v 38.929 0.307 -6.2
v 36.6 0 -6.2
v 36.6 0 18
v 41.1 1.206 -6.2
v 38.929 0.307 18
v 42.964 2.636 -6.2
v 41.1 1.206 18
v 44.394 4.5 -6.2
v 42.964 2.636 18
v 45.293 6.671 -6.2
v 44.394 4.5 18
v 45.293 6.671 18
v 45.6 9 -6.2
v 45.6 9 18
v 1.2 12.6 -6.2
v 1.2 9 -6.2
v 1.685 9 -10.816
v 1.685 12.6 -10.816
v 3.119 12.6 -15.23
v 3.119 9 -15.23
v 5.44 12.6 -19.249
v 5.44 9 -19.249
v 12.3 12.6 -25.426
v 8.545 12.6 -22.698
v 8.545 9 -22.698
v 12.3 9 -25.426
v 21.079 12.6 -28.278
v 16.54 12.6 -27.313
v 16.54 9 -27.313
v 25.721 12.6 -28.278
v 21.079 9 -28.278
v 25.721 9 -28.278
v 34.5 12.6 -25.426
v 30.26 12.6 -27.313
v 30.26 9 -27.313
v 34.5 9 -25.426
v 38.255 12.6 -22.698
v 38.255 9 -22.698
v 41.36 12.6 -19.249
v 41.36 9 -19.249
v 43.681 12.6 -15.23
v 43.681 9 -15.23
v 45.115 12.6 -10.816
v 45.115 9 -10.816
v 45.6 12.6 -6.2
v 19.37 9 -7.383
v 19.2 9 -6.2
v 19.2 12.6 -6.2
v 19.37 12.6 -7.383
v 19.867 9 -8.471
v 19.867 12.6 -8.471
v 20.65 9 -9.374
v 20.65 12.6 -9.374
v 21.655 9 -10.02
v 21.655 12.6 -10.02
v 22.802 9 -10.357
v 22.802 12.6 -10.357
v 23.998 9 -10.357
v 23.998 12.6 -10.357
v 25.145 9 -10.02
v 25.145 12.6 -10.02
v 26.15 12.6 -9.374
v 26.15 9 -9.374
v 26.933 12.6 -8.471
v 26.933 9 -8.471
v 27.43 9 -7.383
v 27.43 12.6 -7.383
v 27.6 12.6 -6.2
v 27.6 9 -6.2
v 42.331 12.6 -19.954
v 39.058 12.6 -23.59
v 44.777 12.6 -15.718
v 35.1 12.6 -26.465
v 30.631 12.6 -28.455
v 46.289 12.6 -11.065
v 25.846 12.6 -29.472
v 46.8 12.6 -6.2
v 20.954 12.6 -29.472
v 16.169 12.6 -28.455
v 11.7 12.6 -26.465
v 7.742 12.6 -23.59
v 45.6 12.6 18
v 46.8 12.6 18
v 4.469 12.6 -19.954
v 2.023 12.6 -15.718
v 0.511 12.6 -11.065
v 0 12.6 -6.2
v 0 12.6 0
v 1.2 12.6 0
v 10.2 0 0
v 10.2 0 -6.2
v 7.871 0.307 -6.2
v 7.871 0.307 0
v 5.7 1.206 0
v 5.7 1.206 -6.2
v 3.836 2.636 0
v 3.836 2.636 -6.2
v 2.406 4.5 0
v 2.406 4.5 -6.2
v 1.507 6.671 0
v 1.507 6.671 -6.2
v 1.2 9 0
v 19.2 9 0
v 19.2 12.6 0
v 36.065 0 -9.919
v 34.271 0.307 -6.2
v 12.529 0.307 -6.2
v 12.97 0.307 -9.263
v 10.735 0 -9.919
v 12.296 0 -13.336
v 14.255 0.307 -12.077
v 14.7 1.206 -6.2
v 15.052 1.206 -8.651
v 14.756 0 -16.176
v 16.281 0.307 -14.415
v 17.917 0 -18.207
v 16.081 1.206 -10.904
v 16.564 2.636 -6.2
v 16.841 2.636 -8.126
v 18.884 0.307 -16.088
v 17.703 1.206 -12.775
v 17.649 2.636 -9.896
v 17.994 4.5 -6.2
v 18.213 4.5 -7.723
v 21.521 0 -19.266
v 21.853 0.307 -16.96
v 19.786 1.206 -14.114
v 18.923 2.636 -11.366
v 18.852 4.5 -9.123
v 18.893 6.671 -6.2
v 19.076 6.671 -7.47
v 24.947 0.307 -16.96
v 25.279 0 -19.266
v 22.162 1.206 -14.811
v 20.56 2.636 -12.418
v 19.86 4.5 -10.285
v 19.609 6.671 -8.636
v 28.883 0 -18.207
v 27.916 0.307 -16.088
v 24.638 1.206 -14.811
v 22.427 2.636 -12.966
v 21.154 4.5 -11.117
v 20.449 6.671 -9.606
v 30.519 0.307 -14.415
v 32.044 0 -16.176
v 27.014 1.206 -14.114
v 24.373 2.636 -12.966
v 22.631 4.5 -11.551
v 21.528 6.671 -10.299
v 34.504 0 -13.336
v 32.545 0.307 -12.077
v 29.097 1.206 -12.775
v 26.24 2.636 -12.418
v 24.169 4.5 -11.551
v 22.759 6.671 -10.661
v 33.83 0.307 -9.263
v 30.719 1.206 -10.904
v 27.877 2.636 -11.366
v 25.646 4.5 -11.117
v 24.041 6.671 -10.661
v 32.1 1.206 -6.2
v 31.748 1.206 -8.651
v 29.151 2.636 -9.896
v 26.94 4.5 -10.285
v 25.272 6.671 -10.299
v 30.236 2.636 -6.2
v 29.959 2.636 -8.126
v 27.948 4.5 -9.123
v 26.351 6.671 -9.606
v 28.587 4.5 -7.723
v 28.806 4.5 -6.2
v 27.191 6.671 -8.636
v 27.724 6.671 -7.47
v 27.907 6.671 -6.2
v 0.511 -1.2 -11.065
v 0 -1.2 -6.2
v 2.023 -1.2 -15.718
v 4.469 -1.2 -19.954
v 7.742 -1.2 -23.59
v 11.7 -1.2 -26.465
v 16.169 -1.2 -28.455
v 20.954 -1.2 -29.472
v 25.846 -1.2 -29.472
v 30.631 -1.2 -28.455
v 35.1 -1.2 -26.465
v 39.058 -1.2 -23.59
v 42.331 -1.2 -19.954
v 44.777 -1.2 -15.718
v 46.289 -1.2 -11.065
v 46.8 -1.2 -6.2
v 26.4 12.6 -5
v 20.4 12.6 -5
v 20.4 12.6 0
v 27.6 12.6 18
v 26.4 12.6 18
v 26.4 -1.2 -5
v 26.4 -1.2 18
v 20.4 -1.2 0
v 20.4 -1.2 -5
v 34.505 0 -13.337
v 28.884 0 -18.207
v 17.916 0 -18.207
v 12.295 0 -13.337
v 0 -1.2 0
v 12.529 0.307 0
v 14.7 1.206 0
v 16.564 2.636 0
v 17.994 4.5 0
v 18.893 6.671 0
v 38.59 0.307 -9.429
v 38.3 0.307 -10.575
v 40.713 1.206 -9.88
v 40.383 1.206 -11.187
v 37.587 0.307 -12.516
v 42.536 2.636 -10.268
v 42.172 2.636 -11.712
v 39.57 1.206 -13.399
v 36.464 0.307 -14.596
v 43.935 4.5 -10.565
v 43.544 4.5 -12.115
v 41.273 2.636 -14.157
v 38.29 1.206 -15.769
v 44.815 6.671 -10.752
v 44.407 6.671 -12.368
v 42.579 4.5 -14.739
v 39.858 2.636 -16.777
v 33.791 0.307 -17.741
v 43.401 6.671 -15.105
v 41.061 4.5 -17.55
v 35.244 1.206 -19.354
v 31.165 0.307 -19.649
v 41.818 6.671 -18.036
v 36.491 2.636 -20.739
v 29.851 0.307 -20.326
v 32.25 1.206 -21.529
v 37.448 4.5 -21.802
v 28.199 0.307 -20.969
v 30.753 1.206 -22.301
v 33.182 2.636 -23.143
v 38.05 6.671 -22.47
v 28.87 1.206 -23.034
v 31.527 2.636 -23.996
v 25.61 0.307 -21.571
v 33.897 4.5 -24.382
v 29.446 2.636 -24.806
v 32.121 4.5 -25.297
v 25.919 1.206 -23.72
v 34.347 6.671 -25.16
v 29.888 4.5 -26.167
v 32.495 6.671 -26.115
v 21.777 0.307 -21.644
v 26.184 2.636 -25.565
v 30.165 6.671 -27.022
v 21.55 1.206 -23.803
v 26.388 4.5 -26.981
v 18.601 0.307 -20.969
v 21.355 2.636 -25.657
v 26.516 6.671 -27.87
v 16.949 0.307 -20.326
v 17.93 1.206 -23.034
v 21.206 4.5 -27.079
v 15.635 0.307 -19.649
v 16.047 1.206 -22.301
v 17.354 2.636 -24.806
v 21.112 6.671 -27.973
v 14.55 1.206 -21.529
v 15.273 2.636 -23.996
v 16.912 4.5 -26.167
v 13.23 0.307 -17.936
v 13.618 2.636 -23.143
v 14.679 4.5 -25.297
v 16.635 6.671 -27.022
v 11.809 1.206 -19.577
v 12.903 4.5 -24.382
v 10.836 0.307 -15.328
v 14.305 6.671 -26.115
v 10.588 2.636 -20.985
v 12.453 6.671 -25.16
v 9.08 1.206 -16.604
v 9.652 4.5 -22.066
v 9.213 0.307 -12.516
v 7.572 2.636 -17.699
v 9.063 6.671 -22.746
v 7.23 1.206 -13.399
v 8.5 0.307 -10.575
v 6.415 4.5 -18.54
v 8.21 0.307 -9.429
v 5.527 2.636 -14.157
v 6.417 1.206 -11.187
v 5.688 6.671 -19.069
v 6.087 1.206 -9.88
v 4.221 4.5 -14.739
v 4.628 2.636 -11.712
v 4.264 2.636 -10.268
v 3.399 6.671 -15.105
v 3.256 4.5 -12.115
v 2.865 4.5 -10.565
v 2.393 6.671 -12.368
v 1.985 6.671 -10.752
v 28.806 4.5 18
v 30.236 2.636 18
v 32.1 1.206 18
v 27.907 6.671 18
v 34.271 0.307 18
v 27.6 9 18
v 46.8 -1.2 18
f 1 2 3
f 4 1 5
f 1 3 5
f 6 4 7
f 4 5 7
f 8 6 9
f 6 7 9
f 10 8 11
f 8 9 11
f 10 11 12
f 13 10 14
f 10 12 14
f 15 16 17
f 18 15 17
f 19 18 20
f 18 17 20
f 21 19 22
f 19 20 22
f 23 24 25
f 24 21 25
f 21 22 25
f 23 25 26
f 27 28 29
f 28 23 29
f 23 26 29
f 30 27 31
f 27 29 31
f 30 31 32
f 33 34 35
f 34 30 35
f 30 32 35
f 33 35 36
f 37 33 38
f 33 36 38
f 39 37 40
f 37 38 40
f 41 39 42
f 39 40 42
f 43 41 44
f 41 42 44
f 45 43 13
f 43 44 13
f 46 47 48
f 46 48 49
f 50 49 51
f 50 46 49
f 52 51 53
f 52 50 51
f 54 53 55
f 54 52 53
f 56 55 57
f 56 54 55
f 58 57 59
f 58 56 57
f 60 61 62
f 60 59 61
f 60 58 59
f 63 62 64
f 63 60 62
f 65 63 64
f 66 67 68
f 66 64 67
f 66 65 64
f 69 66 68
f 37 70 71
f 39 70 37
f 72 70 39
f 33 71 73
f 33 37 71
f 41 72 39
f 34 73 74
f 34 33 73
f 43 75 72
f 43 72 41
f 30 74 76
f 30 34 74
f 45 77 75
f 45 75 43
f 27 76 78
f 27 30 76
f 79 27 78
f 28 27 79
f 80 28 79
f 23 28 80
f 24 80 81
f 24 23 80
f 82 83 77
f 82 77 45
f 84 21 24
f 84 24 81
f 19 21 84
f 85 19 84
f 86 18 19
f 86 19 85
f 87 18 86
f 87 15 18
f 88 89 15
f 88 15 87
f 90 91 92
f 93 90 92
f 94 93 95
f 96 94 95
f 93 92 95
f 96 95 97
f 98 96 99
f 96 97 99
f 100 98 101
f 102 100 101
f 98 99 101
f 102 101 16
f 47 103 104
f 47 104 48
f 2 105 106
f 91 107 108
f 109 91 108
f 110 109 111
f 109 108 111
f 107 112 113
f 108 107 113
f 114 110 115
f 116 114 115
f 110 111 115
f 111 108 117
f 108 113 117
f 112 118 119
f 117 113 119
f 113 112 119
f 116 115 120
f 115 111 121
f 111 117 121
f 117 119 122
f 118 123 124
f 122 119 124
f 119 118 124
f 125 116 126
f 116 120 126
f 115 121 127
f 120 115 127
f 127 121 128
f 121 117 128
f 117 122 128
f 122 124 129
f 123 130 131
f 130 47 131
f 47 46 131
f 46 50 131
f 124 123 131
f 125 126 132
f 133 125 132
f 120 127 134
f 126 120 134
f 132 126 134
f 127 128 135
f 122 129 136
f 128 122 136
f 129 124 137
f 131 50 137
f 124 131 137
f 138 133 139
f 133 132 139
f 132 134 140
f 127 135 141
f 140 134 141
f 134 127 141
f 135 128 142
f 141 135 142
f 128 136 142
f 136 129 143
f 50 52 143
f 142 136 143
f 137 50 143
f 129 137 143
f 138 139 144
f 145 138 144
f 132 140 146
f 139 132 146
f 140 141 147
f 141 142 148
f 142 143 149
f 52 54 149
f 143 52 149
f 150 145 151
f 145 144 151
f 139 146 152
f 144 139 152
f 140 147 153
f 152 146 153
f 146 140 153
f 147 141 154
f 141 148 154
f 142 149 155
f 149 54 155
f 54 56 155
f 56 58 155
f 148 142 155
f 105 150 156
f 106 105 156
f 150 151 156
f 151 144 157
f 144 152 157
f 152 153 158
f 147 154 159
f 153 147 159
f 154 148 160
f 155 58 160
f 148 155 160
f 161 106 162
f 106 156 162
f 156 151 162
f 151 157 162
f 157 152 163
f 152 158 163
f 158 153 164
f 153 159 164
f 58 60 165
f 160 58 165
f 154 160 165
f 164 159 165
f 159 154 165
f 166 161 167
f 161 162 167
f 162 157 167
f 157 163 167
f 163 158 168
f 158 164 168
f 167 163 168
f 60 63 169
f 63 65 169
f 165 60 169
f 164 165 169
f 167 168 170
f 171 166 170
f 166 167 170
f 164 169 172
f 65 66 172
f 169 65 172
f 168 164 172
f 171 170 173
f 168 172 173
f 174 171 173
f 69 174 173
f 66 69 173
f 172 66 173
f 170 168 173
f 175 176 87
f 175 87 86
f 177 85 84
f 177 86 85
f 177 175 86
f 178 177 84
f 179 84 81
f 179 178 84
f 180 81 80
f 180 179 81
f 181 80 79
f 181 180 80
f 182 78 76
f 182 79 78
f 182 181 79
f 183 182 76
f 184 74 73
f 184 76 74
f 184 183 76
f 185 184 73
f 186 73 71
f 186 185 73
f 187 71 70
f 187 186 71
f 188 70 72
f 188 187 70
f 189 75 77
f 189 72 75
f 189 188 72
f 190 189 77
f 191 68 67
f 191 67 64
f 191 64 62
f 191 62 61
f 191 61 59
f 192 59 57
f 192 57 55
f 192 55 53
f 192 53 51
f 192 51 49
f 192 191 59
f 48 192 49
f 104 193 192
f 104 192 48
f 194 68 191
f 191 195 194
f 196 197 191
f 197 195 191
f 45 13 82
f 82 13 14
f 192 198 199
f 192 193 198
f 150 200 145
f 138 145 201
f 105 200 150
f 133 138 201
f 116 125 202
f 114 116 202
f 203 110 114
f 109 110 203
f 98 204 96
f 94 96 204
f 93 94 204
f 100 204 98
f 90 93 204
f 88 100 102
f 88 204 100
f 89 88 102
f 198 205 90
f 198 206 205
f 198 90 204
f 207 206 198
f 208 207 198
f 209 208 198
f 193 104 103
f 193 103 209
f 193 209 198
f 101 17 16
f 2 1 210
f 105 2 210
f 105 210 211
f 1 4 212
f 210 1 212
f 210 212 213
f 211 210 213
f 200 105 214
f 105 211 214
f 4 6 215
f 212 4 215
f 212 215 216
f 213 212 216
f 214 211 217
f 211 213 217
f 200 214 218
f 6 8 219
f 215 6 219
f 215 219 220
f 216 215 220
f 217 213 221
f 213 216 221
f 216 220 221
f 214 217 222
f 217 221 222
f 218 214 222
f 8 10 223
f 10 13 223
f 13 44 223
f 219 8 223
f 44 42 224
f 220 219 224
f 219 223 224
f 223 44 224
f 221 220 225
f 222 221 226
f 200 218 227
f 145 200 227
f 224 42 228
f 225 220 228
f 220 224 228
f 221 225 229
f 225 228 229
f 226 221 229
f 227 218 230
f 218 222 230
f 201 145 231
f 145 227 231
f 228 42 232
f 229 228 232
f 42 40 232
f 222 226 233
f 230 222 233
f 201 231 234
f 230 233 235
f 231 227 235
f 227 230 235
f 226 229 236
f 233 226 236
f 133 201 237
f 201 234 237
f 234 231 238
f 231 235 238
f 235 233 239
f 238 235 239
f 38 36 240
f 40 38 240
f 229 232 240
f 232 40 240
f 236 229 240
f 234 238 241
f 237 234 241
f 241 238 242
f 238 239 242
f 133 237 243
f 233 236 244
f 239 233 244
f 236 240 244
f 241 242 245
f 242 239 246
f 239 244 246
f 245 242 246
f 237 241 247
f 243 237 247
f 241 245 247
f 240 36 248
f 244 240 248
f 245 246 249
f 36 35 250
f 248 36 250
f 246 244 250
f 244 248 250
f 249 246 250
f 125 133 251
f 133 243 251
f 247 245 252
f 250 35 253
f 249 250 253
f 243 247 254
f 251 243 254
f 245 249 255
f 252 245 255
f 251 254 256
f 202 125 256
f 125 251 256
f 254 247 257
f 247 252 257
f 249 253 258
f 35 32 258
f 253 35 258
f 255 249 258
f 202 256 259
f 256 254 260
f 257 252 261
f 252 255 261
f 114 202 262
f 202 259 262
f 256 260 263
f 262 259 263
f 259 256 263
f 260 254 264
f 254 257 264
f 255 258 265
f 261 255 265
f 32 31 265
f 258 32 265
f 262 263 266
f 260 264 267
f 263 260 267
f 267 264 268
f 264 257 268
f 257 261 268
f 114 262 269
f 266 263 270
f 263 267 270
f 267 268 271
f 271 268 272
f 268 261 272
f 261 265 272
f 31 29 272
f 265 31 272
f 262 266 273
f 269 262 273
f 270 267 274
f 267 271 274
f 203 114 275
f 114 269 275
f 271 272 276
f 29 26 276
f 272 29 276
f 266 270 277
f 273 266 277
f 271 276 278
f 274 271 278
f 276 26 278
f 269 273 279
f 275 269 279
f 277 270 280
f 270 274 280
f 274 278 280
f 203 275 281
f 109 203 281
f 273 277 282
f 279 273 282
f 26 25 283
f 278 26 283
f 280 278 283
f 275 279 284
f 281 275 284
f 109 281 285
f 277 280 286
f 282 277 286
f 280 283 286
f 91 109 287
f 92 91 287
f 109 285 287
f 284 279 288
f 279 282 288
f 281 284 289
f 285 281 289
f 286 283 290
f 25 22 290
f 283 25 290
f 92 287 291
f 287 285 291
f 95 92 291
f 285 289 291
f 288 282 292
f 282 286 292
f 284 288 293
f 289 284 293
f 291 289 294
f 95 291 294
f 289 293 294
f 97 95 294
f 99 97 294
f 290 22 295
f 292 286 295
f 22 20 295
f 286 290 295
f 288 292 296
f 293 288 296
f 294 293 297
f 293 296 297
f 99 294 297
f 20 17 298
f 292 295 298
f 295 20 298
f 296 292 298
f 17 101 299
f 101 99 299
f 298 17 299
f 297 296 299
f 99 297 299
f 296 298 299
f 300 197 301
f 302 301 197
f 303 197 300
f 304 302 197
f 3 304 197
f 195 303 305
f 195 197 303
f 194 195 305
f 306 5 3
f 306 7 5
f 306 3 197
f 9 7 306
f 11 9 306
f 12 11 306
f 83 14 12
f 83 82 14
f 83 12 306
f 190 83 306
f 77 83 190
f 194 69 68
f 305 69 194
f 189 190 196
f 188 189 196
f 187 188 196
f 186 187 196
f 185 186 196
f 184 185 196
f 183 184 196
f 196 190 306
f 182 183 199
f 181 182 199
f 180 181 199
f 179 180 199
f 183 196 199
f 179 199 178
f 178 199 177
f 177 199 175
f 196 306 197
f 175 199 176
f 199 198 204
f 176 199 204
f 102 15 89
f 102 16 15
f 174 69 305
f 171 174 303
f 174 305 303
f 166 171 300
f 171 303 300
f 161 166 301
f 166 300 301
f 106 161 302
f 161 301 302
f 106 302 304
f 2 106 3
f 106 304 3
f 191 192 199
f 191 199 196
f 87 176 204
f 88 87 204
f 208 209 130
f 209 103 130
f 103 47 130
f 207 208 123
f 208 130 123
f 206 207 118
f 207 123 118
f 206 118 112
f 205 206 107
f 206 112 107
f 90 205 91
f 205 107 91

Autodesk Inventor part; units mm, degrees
ref_plane "YZ Plane" through (0, 0, 0) normal (1, 0, 0) x (0, 1, 0)
ref_plane "XZ Plane" through (0, 0, 0) normal (0, 1, 0) x (-1, 0, 0)
ref_plane "XY Plane" through (0, 0, 0) normal (0, 0, 1) x (1, 0, 0)
sketch "Esboço1" plane through (0, 0, 0) normal (0, 1, 0) x (-1, 0, 0)
  line L0 (-1.2, -1.2) -> (-19.2, -1.2)
  line L1 (-19.2, -1.2) -> (-19.2, -6.2)
  line L2 (-19.2, -6.2) -> (-27.6, -6.2)
  line L3 (-27.6, -6.2) -> (-27.6, -1.2)
  line L4 (-27.6, -1.2) -> (-45.6, -1.2)
  line L5 (-45.6, -1.2) -> (-45.6, -6.2)
  arc A0 (-45.6, -6.2) -> (-1.2, -6.2) centre (-23.4, -6.2) ccw
  line L6 (-23.4, -6.2) -> (-45.6, -6.2) construction
  line L7 (-23.4, -6.2) -> (-1.2, -6.2) construction
  line L8 (-1.2, -6.2) -> (-1.2, -1.2)
  arc A1 (-46.8, -6.2) -> (0, -6.2) centre (-23.4, -6.2) ccw
  line L9 (0, -6.2) -> (0, 0)
  line L10 (0, 0) -> (-20.4, 0)
  line L11 (-20.4, 0) -> (-20.4, -5)
  line L12 (-20.4, -5) -> (-26.4, -5)
  line L13 (-46.8, 18) -> (-46.8, -6.2)
  line L14 (-27.6, -1.2) -> (-27.6, 18)
  line L15 (-19.2, -1.2) -> (-19.2, 0)
  line L16 (-1.2, -1.2) -> (-1.2, 0)
  arc A2 (-27.6, -6.2) -> (-19.2, -6.2) centre (-23.4, -6.2) ccw
  line L17 (-26.4, 18) -> (-46.8, 18)
  line L18 (-45.6, -1.2) -> (-45.6, 18)
  line L19 (-26.4, 18) -> (-26.4, -5)
  point P0 (-23.4, -6.2)
  point P1 (-46.8, -6.2)
  point P2 (-19.2, -6.2)
  point P3 (-27.6, -6.2)
  point P4 (-45.6, -6.2)
  point P5 (-36.6, 18)
  point P6 (-36.6, -1.2)
  point P7 (-45.6, -3.7)
  point P8 (-45.6, 8.4)
  point P9 (-23.4, -5)
  point P10 (-26.4, 6.5)
  dimension "d0" = 18
  dimension "d1" = 180
  dimension "d3" = 1.2
  dimension "d7" = 18
  dimension "d15" = 1.2
  dimension "d16" = 6
  dimension "d18" = 19.2
  dimension "d19" = 5
extrude "Extrusão1" add sketch "Esboço1" against normal blind 1.2
extrude "Extrusão3" add sketch "Esboço1" along normal blind 12.6 contours L16 L10 L9 A1 L13 L17 L18 L5 A0 L8 | L1 L2 L3 L14 L17 L19 L12 L11 L10 L15 | A2 L2
fillet "Arredondamento1" radius 9 6 edges at (1.2, 0, -3.1) (45.6, 0, 5.9) (23.4, 0, -28.4) (27.6, 0, 5.9) (19.2, 0, -3.1) (23.4, 0, -10.4)
equation "\"d0\" = Diâmetro_esfera"
equation "\"d3\" = Margem"
equation "\"d15\" = Margem"
equation "\"d16\" = Espessura_torre_base"
equation "\"d8\" = Margem"
equation "\"d12\" = 0.7 * Diâmetro_esfera"
equation "\"d14\" = 0.5 * Diâmetro_esfera"
equation "\"Diâmetro_esfera\" = 18"
equation "\"Filamento\" = 0.4"
equation "\"Margem\" = 3 * Filamento"
equation "\"Espessura_torre_base\" = 15 * Filamento"
properties part number "Troca de sentido" material "Plástico PET"
